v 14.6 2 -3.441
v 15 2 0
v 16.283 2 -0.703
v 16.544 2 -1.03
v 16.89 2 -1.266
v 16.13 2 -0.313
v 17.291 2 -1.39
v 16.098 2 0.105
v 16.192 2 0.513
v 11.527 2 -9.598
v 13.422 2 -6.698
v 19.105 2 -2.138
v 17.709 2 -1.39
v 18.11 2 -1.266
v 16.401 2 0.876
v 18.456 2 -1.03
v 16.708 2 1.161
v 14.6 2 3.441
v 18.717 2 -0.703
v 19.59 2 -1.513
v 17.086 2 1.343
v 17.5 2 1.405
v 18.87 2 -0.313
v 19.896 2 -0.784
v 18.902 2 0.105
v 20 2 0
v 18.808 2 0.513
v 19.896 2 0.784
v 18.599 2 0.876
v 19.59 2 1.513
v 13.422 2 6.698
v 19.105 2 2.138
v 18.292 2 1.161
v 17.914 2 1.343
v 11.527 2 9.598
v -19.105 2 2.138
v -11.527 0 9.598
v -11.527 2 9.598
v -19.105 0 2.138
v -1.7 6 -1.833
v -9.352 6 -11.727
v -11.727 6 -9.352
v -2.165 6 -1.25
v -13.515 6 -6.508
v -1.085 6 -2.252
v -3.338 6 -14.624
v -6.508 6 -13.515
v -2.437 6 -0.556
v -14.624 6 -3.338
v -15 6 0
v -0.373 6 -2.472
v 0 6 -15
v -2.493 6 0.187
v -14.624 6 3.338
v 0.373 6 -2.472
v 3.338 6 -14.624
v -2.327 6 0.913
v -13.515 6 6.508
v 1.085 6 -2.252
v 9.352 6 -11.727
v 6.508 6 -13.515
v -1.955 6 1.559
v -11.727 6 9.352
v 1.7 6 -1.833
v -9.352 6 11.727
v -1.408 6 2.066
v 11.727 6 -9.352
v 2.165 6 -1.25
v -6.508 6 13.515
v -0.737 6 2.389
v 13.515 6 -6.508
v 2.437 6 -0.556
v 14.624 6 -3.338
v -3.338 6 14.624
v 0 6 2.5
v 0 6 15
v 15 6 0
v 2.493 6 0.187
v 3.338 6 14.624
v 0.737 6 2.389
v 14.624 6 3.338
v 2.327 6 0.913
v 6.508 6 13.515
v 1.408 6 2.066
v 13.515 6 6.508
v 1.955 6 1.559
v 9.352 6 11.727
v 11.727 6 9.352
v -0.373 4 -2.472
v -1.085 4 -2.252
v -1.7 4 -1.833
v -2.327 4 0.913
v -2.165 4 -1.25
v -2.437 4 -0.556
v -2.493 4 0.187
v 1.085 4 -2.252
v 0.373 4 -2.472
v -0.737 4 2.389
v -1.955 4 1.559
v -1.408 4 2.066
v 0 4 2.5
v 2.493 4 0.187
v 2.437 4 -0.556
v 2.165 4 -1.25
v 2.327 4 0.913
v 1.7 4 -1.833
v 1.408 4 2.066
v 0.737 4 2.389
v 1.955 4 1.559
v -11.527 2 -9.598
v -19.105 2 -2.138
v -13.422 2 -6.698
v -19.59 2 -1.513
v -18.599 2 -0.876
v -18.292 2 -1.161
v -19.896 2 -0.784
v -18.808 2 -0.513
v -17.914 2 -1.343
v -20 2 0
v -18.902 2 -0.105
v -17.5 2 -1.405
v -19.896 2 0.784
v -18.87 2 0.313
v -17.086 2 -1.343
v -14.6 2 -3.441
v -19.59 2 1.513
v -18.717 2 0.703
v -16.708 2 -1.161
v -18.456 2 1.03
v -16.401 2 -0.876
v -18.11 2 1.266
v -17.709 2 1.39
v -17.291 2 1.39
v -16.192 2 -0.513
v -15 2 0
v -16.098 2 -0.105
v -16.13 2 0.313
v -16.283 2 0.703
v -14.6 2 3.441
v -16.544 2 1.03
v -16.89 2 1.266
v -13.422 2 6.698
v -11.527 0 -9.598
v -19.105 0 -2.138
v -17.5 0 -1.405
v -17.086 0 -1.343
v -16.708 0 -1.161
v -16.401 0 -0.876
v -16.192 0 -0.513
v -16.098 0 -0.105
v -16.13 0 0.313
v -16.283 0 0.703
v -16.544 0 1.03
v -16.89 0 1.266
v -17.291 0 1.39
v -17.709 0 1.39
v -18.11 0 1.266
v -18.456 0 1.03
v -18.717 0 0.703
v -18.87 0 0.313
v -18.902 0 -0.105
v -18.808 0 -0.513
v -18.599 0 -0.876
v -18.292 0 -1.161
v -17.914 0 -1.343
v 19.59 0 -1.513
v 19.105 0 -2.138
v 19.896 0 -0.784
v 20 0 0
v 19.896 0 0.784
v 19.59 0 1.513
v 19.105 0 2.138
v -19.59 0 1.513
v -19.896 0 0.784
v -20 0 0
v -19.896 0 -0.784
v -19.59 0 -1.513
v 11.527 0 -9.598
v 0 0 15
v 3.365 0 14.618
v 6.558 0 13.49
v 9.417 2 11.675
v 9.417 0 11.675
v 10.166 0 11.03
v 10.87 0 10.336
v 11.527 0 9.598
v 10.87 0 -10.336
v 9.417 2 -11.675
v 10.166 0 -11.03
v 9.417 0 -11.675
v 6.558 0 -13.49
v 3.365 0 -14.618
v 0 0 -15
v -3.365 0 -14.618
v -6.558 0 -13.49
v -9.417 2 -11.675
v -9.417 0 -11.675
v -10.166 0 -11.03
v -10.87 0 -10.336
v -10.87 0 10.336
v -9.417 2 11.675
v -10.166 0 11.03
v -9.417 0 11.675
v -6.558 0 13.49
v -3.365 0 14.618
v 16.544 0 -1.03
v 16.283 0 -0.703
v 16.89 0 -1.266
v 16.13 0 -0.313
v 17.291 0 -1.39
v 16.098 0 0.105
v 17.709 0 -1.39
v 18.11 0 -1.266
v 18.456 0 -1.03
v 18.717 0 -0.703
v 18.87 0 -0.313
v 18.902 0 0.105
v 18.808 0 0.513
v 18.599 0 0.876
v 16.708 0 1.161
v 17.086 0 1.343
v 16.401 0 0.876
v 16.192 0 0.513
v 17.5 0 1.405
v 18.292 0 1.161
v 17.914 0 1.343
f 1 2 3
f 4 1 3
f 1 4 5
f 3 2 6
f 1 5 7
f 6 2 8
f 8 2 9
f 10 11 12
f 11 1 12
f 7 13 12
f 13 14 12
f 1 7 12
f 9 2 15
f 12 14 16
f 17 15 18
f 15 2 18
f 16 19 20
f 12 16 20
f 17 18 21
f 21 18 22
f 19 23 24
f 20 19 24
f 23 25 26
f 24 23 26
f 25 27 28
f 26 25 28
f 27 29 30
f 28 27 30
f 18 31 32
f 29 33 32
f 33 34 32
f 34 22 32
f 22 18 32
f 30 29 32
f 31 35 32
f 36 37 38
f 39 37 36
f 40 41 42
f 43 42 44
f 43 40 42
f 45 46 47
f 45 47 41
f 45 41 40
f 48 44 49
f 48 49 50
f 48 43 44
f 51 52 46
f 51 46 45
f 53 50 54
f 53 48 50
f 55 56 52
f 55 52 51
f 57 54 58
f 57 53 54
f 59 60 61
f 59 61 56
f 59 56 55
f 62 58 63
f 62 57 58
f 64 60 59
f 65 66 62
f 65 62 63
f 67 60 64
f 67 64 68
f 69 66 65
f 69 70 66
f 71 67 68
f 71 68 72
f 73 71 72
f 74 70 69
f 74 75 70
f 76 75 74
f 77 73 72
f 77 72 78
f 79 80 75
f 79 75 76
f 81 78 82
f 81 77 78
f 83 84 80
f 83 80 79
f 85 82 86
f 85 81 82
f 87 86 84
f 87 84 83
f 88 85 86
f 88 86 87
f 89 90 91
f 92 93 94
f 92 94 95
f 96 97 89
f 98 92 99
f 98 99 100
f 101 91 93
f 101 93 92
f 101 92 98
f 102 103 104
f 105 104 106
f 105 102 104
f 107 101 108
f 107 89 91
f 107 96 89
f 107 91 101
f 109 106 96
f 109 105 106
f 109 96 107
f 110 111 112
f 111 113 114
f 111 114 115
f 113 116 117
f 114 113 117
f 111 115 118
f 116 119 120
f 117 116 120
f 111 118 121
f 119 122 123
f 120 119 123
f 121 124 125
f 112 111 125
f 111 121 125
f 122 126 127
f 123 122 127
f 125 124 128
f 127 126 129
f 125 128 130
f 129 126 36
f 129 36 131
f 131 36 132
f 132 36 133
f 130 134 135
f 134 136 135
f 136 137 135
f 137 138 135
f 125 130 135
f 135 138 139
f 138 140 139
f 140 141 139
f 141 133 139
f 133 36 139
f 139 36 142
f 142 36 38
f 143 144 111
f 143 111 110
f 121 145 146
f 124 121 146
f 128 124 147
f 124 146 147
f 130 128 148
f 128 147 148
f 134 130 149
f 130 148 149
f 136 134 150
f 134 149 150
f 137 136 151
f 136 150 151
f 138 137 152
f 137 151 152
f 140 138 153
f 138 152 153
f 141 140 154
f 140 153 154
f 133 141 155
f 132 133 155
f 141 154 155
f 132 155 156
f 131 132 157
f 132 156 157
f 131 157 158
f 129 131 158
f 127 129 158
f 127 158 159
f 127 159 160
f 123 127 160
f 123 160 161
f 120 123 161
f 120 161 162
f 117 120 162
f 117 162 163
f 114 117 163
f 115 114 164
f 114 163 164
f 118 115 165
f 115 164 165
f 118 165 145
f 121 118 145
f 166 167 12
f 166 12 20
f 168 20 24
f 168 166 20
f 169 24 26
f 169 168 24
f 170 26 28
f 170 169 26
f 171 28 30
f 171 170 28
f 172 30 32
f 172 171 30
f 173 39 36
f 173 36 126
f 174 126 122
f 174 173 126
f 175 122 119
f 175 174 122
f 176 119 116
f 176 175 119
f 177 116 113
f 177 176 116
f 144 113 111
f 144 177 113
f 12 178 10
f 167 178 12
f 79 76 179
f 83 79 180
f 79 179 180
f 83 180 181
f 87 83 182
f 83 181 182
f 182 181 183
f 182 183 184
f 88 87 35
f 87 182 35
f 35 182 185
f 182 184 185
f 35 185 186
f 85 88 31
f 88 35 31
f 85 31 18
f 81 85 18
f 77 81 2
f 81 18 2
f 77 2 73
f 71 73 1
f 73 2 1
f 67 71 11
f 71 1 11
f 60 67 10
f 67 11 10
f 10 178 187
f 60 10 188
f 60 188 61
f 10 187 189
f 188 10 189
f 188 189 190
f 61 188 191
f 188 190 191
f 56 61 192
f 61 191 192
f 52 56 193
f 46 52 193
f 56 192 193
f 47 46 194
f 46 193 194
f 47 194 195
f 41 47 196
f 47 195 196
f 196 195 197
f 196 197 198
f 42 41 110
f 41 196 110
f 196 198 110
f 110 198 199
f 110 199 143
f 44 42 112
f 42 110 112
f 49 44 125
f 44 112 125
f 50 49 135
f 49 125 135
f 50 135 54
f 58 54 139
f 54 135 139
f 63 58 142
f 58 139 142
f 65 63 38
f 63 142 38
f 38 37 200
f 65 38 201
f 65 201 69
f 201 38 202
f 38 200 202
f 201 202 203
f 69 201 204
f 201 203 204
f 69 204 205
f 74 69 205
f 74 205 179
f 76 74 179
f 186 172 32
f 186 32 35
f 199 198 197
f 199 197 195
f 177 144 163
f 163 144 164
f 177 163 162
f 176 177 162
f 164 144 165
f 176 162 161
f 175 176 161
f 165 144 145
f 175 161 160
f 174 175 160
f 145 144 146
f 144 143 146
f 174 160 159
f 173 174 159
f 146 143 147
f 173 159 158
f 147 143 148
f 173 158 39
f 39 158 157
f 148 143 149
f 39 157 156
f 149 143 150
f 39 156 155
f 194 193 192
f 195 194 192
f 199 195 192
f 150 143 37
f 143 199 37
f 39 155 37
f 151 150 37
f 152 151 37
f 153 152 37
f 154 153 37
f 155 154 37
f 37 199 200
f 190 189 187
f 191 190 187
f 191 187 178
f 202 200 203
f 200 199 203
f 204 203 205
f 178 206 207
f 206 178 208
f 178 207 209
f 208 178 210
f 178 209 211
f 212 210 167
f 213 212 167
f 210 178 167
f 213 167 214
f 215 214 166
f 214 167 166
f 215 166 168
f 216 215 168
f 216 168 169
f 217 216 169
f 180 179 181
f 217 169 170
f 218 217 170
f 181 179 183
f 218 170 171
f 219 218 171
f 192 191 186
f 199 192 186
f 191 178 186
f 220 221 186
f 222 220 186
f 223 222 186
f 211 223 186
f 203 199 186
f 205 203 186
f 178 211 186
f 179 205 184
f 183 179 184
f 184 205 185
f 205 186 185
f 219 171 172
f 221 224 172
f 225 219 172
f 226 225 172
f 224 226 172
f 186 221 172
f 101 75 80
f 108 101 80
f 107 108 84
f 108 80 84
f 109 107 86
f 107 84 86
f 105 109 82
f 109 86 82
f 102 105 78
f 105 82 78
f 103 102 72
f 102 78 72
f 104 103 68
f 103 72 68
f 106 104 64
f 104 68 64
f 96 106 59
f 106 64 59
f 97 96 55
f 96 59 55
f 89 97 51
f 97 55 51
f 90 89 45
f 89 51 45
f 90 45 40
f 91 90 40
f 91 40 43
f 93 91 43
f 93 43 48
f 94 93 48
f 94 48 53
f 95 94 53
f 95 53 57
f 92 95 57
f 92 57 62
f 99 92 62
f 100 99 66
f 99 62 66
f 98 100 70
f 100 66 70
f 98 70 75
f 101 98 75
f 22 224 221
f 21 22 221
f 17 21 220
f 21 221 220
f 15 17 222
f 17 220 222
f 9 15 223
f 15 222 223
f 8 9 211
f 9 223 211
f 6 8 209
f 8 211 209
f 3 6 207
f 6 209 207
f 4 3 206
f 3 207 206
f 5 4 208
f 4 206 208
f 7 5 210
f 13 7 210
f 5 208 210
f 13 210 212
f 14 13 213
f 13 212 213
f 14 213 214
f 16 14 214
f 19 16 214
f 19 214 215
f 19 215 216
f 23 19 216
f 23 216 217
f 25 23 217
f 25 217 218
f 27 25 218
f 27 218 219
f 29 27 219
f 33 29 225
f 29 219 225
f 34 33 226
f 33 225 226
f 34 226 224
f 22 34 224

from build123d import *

# Parameters (mm, degrees)
SKETCH_1_R          = 15
EXTRUDE_1_DEPTH     = 6
SKETCH_2_R          = 2.5
CUT_EXTRUDE_1_DEPTH = 2
SKETCH_3_R          = 1.40543951
EXTRUDE_2_DEPTH     = 2


with BuildPart() as part:
    # 草图1 → 凸台-拉伸1 (new body)
    with BuildSketch(Plane(origin=(0, 0, 0), x_dir=(1, 0, 0), z_dir=(0, 1, 0))):
        with Locations(Location((0, 0, 0), (0, 0, 270))):
            Circle(SKETCH_1_R)
    extrude(amount=EXTRUDE_1_DEPTH)

    # 草图2 → 切除-拉伸1 (cut)
    with BuildSketch(Plane(origin=(0, 6, 0), x_dir=(1, 0, 0), z_dir=(0, 1, 0))):
        with Locations(Location((0, 0, 0), (0, 0, 270))):
            Circle(SKETCH_2_R)
    extrude(amount=-CUT_EXTRUDE_1_DEPTH, mode=Mode.SUBTRACT)

    # 草图3 → 凸台-拉伸2 (add)
    # profile 1 of 2: a face of its own
    with BuildSketch(Plane.XZ):
        with BuildLine():
            Line((-9.417192288, 11.675465276), (-19.104721401, 2.137790407))
            ThreePointArc((-19.104721401, 2.137790407), (-20, 0), (-19.104721401, -2.137790407))
            Line((-19.104721401, -2.137790407), (-9.417192288, -11.675465276))
            Line((-9.417192288, -11.675465276), (-9.417192288, 11.675465276))
        make_face()
        with Locations(Location((-17.5, 0, 0), (0, 0, 270))):
            Circle(SKETCH_3_R, mode=Mode.SUBTRACT)
    # profile 2 of 2: a face of its own
    with BuildSketch(Plane.XZ):
        with BuildLine():
            Line((9.417192288, 11.675465276), (9.417192288, -11.675465276))
            Line((9.417192288, -11.675465276), (19.104721401, -2.137790407))
            ThreePointArc((19.104721401, -2.137790407), (20, 0), (19.104721401, 2.137790407))
            Line((19.104721401, 2.137790407), (9.417192288, 11.675465276))
        make_face()
        with Locations(Location((17.5, 0, 0), (0, 0, 90))):
            Circle(SKETCH_3_R, mode=Mode.SUBTRACT)
    extrude(amount=-EXTRUDE_2_DEPTH)


solid = part.part
